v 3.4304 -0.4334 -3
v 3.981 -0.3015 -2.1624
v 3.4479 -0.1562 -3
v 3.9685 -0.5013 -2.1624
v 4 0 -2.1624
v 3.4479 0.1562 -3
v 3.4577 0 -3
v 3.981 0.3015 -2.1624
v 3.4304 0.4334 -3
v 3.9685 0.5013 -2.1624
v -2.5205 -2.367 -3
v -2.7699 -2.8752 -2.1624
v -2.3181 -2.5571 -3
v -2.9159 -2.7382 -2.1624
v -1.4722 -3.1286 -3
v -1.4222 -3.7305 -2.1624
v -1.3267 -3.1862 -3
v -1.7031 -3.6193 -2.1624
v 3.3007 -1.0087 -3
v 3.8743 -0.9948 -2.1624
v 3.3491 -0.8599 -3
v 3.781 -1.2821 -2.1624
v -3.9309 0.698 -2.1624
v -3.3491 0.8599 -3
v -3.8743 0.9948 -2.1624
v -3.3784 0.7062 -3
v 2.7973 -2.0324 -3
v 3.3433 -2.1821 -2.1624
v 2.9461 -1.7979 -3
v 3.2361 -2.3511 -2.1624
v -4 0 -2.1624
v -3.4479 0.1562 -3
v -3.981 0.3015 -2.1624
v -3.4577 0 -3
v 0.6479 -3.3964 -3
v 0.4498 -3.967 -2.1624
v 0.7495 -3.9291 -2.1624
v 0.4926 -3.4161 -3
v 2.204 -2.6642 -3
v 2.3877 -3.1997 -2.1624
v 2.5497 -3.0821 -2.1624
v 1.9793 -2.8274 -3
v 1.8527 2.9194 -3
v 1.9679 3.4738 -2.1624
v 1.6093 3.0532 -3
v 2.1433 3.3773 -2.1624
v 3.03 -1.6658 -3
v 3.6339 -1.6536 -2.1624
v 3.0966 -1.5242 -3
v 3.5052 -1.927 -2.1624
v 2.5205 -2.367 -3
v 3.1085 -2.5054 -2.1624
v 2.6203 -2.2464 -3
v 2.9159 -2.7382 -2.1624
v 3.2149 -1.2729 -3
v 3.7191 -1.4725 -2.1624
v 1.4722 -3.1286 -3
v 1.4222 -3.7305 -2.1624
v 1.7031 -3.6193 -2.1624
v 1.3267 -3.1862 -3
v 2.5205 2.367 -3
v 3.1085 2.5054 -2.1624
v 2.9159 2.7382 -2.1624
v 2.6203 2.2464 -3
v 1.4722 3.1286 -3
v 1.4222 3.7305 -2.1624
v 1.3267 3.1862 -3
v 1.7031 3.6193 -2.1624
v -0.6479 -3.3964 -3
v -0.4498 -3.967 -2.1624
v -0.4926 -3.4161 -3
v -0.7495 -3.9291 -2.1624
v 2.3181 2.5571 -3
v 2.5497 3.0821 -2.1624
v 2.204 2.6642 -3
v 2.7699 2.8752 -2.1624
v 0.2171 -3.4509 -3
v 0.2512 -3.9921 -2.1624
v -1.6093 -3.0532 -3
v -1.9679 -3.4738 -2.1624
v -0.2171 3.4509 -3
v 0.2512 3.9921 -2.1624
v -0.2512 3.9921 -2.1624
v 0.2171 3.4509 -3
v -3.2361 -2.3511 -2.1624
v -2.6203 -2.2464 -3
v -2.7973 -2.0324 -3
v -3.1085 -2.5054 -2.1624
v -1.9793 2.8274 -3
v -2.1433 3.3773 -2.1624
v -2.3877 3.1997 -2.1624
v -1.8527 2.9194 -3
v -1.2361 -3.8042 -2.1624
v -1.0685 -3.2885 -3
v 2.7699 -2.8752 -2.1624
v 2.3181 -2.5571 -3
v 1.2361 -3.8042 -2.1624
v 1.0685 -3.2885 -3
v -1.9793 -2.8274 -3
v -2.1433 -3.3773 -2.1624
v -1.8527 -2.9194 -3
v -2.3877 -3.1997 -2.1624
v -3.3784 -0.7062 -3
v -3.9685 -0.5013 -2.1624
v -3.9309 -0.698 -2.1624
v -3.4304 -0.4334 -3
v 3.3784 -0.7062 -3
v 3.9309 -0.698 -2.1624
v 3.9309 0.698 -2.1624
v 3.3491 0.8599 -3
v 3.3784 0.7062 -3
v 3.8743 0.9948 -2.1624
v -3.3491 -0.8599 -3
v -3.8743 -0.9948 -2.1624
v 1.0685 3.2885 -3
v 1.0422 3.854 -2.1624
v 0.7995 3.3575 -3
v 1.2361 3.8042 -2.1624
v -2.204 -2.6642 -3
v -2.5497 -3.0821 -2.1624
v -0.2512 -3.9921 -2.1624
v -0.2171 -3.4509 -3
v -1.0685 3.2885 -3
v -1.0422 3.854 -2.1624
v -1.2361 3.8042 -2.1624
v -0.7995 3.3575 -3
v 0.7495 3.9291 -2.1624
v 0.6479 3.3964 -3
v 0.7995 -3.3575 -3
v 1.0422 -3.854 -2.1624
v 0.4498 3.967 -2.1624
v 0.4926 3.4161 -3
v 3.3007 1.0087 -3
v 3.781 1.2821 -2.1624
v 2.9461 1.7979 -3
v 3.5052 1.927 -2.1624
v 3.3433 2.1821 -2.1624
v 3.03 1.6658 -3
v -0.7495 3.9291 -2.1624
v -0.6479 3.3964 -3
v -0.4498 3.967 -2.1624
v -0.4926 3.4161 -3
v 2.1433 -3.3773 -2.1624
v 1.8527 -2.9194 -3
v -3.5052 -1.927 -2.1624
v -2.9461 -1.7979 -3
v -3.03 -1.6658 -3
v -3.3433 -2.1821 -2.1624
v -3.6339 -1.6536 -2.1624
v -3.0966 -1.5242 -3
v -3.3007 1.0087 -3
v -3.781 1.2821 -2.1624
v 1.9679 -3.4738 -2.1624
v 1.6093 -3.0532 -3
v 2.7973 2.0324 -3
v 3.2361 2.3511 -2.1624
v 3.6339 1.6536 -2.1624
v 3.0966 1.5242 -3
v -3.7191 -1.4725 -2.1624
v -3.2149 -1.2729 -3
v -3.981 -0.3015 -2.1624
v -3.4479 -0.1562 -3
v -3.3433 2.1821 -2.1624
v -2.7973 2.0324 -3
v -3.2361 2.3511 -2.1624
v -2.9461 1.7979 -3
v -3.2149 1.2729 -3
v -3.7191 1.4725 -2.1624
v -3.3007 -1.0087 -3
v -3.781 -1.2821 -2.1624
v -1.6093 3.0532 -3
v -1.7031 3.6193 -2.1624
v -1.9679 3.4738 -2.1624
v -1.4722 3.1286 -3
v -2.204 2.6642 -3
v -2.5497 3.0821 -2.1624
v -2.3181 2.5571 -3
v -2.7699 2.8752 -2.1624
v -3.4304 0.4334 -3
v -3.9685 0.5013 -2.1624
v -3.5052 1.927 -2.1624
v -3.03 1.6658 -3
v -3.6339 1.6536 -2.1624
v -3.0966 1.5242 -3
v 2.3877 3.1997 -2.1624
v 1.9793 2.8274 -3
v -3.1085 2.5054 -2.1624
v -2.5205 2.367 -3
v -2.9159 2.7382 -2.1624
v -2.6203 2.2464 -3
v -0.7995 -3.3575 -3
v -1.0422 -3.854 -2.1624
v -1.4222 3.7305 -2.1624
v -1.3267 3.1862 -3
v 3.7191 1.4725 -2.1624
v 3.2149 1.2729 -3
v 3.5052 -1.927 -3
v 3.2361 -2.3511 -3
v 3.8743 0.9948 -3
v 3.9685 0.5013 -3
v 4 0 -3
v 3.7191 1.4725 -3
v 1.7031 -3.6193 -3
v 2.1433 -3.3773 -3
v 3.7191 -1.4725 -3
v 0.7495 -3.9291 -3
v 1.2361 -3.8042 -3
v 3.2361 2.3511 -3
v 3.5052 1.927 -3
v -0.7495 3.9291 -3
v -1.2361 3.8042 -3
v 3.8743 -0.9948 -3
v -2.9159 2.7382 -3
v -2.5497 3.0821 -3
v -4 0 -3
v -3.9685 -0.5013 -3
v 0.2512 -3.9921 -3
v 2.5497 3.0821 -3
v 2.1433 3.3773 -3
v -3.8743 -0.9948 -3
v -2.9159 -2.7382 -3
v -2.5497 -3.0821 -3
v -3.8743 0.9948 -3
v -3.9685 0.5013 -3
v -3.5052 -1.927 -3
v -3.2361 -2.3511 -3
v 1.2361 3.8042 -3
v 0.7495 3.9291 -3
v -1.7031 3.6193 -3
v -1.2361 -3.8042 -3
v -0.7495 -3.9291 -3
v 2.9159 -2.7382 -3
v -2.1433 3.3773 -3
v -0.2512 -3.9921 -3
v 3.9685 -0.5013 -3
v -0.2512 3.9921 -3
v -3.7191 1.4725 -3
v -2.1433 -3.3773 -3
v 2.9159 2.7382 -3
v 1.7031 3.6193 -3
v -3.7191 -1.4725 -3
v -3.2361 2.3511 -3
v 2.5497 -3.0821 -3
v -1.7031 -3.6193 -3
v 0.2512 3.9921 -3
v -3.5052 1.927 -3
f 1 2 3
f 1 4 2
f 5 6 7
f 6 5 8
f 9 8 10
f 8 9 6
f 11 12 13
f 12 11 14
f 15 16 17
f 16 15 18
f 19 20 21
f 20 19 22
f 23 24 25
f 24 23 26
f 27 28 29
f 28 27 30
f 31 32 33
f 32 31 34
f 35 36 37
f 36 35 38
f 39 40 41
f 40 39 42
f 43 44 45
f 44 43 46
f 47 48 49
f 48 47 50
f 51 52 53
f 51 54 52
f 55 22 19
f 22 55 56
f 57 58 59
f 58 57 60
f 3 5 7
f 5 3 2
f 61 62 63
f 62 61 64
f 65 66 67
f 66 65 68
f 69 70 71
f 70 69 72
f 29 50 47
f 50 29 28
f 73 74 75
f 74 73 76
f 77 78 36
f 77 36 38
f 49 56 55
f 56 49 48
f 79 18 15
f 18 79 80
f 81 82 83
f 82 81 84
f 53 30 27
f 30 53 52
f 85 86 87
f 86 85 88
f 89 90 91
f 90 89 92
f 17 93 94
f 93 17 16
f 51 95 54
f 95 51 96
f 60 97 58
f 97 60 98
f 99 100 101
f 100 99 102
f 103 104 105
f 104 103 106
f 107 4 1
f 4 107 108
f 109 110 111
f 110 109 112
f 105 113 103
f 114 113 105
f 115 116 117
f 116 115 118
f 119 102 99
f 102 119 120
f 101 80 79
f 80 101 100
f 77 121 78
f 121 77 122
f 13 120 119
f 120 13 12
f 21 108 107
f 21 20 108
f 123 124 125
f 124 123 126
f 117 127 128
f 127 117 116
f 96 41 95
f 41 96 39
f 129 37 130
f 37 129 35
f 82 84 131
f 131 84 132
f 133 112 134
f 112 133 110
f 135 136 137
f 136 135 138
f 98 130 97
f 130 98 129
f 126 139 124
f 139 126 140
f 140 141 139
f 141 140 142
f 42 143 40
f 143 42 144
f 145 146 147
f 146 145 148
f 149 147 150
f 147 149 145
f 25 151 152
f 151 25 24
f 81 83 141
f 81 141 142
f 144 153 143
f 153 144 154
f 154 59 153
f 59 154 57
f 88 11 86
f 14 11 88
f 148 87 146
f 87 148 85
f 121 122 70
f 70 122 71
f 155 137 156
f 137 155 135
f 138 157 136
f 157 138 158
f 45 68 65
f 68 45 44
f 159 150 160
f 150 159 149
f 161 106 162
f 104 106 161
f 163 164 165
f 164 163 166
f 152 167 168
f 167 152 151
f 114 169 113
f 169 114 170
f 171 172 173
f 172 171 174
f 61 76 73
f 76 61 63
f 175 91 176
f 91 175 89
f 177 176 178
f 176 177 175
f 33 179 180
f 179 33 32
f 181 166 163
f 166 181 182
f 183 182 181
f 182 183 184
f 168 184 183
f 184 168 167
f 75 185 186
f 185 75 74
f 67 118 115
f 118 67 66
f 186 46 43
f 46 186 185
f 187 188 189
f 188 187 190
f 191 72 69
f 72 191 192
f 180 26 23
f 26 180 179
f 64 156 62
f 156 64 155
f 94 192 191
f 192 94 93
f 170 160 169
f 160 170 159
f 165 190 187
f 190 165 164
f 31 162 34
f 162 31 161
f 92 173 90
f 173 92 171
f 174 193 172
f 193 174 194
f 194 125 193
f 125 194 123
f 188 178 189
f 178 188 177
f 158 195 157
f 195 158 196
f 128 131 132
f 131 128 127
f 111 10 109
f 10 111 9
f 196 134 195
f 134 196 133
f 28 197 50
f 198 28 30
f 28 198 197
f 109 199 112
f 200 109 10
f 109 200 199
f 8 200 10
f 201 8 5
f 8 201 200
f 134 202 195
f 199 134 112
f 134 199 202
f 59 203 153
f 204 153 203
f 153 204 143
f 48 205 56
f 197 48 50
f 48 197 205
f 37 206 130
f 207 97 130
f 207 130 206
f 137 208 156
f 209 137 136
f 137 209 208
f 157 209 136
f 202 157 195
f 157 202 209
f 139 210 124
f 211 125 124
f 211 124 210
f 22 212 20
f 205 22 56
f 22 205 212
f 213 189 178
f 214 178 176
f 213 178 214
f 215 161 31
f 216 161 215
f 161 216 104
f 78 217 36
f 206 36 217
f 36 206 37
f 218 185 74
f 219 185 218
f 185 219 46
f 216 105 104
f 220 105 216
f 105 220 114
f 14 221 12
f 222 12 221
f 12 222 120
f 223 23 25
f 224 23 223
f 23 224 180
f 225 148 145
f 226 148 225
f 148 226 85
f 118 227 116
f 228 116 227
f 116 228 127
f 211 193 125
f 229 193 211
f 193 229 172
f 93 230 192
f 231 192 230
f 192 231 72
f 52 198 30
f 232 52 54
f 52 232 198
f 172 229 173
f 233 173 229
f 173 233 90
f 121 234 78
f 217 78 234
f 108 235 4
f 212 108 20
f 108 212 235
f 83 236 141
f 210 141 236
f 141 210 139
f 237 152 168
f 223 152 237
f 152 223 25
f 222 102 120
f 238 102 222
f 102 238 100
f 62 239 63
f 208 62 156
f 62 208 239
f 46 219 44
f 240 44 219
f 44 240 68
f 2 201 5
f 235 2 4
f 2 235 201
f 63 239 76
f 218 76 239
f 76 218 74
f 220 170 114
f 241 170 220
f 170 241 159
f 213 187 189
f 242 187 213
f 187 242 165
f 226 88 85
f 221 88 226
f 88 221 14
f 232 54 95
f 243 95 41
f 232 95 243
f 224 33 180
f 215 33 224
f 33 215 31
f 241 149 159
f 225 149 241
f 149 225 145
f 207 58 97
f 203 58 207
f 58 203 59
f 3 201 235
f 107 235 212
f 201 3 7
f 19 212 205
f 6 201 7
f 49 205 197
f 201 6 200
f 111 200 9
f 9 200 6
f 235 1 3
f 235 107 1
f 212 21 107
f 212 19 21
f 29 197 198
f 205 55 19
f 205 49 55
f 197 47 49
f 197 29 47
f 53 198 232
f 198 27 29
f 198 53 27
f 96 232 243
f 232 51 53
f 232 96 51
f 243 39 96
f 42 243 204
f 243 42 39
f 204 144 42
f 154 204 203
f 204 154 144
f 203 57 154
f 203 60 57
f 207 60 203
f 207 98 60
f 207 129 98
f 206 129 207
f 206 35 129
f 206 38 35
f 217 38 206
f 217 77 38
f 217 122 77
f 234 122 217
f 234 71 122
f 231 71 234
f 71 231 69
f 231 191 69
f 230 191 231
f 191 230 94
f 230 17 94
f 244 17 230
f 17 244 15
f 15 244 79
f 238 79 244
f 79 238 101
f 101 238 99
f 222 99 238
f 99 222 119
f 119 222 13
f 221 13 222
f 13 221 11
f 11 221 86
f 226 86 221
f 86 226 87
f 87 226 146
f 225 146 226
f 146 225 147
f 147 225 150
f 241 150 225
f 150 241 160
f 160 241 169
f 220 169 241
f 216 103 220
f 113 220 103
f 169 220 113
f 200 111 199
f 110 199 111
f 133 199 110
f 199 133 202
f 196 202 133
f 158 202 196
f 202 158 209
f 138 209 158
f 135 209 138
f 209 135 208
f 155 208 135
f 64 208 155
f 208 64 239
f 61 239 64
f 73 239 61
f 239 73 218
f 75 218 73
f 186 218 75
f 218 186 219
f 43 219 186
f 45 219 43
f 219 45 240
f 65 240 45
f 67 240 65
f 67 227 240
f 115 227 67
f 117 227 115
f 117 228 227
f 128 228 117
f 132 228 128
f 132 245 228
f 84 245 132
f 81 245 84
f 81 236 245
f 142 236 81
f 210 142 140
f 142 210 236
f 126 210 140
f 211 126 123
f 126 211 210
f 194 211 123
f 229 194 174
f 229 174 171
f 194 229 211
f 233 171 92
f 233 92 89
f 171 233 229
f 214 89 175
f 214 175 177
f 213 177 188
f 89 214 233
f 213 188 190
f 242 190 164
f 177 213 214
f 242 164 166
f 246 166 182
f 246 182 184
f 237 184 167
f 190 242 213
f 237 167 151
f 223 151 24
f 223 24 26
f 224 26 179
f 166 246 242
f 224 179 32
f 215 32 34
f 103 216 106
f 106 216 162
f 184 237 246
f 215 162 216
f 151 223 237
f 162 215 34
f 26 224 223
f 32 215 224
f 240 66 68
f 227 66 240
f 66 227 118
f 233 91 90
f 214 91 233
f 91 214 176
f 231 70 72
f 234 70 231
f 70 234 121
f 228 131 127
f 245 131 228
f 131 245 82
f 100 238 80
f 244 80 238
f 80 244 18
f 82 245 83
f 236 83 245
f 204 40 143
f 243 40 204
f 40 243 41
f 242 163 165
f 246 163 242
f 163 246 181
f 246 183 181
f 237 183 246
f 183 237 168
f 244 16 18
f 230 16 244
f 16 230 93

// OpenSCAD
$fn = 50;

difference() {
	union() {
		translate(v = [0, 0, -3.0]) {
			cylinder(h = 3, r = 4.0);
		}
	}
	union() {
		translate(v = [0, 0, 0]) {
			rotate(a = [0, 0, 0]) {
				difference() {
					union() {
						translate(v = [0, 0, -6.0]) {
							cylinder(h = 6, r = 2.6);
						}
						translate(v = [0, 0, -3.9]) {
							cylinder(h = 3.9, r1 = 2.875, r2 = 5.4);
						}
						translate(v = [0, 0, -6.0]) {
							cylinder(h = 6, r = 2.875);
						}
						translate(v = [0, 0, -6.0]) {
							cylinder(h = 6, r = 2.6);
						}
					}
					union();
				}
			}
		}
	}
}
